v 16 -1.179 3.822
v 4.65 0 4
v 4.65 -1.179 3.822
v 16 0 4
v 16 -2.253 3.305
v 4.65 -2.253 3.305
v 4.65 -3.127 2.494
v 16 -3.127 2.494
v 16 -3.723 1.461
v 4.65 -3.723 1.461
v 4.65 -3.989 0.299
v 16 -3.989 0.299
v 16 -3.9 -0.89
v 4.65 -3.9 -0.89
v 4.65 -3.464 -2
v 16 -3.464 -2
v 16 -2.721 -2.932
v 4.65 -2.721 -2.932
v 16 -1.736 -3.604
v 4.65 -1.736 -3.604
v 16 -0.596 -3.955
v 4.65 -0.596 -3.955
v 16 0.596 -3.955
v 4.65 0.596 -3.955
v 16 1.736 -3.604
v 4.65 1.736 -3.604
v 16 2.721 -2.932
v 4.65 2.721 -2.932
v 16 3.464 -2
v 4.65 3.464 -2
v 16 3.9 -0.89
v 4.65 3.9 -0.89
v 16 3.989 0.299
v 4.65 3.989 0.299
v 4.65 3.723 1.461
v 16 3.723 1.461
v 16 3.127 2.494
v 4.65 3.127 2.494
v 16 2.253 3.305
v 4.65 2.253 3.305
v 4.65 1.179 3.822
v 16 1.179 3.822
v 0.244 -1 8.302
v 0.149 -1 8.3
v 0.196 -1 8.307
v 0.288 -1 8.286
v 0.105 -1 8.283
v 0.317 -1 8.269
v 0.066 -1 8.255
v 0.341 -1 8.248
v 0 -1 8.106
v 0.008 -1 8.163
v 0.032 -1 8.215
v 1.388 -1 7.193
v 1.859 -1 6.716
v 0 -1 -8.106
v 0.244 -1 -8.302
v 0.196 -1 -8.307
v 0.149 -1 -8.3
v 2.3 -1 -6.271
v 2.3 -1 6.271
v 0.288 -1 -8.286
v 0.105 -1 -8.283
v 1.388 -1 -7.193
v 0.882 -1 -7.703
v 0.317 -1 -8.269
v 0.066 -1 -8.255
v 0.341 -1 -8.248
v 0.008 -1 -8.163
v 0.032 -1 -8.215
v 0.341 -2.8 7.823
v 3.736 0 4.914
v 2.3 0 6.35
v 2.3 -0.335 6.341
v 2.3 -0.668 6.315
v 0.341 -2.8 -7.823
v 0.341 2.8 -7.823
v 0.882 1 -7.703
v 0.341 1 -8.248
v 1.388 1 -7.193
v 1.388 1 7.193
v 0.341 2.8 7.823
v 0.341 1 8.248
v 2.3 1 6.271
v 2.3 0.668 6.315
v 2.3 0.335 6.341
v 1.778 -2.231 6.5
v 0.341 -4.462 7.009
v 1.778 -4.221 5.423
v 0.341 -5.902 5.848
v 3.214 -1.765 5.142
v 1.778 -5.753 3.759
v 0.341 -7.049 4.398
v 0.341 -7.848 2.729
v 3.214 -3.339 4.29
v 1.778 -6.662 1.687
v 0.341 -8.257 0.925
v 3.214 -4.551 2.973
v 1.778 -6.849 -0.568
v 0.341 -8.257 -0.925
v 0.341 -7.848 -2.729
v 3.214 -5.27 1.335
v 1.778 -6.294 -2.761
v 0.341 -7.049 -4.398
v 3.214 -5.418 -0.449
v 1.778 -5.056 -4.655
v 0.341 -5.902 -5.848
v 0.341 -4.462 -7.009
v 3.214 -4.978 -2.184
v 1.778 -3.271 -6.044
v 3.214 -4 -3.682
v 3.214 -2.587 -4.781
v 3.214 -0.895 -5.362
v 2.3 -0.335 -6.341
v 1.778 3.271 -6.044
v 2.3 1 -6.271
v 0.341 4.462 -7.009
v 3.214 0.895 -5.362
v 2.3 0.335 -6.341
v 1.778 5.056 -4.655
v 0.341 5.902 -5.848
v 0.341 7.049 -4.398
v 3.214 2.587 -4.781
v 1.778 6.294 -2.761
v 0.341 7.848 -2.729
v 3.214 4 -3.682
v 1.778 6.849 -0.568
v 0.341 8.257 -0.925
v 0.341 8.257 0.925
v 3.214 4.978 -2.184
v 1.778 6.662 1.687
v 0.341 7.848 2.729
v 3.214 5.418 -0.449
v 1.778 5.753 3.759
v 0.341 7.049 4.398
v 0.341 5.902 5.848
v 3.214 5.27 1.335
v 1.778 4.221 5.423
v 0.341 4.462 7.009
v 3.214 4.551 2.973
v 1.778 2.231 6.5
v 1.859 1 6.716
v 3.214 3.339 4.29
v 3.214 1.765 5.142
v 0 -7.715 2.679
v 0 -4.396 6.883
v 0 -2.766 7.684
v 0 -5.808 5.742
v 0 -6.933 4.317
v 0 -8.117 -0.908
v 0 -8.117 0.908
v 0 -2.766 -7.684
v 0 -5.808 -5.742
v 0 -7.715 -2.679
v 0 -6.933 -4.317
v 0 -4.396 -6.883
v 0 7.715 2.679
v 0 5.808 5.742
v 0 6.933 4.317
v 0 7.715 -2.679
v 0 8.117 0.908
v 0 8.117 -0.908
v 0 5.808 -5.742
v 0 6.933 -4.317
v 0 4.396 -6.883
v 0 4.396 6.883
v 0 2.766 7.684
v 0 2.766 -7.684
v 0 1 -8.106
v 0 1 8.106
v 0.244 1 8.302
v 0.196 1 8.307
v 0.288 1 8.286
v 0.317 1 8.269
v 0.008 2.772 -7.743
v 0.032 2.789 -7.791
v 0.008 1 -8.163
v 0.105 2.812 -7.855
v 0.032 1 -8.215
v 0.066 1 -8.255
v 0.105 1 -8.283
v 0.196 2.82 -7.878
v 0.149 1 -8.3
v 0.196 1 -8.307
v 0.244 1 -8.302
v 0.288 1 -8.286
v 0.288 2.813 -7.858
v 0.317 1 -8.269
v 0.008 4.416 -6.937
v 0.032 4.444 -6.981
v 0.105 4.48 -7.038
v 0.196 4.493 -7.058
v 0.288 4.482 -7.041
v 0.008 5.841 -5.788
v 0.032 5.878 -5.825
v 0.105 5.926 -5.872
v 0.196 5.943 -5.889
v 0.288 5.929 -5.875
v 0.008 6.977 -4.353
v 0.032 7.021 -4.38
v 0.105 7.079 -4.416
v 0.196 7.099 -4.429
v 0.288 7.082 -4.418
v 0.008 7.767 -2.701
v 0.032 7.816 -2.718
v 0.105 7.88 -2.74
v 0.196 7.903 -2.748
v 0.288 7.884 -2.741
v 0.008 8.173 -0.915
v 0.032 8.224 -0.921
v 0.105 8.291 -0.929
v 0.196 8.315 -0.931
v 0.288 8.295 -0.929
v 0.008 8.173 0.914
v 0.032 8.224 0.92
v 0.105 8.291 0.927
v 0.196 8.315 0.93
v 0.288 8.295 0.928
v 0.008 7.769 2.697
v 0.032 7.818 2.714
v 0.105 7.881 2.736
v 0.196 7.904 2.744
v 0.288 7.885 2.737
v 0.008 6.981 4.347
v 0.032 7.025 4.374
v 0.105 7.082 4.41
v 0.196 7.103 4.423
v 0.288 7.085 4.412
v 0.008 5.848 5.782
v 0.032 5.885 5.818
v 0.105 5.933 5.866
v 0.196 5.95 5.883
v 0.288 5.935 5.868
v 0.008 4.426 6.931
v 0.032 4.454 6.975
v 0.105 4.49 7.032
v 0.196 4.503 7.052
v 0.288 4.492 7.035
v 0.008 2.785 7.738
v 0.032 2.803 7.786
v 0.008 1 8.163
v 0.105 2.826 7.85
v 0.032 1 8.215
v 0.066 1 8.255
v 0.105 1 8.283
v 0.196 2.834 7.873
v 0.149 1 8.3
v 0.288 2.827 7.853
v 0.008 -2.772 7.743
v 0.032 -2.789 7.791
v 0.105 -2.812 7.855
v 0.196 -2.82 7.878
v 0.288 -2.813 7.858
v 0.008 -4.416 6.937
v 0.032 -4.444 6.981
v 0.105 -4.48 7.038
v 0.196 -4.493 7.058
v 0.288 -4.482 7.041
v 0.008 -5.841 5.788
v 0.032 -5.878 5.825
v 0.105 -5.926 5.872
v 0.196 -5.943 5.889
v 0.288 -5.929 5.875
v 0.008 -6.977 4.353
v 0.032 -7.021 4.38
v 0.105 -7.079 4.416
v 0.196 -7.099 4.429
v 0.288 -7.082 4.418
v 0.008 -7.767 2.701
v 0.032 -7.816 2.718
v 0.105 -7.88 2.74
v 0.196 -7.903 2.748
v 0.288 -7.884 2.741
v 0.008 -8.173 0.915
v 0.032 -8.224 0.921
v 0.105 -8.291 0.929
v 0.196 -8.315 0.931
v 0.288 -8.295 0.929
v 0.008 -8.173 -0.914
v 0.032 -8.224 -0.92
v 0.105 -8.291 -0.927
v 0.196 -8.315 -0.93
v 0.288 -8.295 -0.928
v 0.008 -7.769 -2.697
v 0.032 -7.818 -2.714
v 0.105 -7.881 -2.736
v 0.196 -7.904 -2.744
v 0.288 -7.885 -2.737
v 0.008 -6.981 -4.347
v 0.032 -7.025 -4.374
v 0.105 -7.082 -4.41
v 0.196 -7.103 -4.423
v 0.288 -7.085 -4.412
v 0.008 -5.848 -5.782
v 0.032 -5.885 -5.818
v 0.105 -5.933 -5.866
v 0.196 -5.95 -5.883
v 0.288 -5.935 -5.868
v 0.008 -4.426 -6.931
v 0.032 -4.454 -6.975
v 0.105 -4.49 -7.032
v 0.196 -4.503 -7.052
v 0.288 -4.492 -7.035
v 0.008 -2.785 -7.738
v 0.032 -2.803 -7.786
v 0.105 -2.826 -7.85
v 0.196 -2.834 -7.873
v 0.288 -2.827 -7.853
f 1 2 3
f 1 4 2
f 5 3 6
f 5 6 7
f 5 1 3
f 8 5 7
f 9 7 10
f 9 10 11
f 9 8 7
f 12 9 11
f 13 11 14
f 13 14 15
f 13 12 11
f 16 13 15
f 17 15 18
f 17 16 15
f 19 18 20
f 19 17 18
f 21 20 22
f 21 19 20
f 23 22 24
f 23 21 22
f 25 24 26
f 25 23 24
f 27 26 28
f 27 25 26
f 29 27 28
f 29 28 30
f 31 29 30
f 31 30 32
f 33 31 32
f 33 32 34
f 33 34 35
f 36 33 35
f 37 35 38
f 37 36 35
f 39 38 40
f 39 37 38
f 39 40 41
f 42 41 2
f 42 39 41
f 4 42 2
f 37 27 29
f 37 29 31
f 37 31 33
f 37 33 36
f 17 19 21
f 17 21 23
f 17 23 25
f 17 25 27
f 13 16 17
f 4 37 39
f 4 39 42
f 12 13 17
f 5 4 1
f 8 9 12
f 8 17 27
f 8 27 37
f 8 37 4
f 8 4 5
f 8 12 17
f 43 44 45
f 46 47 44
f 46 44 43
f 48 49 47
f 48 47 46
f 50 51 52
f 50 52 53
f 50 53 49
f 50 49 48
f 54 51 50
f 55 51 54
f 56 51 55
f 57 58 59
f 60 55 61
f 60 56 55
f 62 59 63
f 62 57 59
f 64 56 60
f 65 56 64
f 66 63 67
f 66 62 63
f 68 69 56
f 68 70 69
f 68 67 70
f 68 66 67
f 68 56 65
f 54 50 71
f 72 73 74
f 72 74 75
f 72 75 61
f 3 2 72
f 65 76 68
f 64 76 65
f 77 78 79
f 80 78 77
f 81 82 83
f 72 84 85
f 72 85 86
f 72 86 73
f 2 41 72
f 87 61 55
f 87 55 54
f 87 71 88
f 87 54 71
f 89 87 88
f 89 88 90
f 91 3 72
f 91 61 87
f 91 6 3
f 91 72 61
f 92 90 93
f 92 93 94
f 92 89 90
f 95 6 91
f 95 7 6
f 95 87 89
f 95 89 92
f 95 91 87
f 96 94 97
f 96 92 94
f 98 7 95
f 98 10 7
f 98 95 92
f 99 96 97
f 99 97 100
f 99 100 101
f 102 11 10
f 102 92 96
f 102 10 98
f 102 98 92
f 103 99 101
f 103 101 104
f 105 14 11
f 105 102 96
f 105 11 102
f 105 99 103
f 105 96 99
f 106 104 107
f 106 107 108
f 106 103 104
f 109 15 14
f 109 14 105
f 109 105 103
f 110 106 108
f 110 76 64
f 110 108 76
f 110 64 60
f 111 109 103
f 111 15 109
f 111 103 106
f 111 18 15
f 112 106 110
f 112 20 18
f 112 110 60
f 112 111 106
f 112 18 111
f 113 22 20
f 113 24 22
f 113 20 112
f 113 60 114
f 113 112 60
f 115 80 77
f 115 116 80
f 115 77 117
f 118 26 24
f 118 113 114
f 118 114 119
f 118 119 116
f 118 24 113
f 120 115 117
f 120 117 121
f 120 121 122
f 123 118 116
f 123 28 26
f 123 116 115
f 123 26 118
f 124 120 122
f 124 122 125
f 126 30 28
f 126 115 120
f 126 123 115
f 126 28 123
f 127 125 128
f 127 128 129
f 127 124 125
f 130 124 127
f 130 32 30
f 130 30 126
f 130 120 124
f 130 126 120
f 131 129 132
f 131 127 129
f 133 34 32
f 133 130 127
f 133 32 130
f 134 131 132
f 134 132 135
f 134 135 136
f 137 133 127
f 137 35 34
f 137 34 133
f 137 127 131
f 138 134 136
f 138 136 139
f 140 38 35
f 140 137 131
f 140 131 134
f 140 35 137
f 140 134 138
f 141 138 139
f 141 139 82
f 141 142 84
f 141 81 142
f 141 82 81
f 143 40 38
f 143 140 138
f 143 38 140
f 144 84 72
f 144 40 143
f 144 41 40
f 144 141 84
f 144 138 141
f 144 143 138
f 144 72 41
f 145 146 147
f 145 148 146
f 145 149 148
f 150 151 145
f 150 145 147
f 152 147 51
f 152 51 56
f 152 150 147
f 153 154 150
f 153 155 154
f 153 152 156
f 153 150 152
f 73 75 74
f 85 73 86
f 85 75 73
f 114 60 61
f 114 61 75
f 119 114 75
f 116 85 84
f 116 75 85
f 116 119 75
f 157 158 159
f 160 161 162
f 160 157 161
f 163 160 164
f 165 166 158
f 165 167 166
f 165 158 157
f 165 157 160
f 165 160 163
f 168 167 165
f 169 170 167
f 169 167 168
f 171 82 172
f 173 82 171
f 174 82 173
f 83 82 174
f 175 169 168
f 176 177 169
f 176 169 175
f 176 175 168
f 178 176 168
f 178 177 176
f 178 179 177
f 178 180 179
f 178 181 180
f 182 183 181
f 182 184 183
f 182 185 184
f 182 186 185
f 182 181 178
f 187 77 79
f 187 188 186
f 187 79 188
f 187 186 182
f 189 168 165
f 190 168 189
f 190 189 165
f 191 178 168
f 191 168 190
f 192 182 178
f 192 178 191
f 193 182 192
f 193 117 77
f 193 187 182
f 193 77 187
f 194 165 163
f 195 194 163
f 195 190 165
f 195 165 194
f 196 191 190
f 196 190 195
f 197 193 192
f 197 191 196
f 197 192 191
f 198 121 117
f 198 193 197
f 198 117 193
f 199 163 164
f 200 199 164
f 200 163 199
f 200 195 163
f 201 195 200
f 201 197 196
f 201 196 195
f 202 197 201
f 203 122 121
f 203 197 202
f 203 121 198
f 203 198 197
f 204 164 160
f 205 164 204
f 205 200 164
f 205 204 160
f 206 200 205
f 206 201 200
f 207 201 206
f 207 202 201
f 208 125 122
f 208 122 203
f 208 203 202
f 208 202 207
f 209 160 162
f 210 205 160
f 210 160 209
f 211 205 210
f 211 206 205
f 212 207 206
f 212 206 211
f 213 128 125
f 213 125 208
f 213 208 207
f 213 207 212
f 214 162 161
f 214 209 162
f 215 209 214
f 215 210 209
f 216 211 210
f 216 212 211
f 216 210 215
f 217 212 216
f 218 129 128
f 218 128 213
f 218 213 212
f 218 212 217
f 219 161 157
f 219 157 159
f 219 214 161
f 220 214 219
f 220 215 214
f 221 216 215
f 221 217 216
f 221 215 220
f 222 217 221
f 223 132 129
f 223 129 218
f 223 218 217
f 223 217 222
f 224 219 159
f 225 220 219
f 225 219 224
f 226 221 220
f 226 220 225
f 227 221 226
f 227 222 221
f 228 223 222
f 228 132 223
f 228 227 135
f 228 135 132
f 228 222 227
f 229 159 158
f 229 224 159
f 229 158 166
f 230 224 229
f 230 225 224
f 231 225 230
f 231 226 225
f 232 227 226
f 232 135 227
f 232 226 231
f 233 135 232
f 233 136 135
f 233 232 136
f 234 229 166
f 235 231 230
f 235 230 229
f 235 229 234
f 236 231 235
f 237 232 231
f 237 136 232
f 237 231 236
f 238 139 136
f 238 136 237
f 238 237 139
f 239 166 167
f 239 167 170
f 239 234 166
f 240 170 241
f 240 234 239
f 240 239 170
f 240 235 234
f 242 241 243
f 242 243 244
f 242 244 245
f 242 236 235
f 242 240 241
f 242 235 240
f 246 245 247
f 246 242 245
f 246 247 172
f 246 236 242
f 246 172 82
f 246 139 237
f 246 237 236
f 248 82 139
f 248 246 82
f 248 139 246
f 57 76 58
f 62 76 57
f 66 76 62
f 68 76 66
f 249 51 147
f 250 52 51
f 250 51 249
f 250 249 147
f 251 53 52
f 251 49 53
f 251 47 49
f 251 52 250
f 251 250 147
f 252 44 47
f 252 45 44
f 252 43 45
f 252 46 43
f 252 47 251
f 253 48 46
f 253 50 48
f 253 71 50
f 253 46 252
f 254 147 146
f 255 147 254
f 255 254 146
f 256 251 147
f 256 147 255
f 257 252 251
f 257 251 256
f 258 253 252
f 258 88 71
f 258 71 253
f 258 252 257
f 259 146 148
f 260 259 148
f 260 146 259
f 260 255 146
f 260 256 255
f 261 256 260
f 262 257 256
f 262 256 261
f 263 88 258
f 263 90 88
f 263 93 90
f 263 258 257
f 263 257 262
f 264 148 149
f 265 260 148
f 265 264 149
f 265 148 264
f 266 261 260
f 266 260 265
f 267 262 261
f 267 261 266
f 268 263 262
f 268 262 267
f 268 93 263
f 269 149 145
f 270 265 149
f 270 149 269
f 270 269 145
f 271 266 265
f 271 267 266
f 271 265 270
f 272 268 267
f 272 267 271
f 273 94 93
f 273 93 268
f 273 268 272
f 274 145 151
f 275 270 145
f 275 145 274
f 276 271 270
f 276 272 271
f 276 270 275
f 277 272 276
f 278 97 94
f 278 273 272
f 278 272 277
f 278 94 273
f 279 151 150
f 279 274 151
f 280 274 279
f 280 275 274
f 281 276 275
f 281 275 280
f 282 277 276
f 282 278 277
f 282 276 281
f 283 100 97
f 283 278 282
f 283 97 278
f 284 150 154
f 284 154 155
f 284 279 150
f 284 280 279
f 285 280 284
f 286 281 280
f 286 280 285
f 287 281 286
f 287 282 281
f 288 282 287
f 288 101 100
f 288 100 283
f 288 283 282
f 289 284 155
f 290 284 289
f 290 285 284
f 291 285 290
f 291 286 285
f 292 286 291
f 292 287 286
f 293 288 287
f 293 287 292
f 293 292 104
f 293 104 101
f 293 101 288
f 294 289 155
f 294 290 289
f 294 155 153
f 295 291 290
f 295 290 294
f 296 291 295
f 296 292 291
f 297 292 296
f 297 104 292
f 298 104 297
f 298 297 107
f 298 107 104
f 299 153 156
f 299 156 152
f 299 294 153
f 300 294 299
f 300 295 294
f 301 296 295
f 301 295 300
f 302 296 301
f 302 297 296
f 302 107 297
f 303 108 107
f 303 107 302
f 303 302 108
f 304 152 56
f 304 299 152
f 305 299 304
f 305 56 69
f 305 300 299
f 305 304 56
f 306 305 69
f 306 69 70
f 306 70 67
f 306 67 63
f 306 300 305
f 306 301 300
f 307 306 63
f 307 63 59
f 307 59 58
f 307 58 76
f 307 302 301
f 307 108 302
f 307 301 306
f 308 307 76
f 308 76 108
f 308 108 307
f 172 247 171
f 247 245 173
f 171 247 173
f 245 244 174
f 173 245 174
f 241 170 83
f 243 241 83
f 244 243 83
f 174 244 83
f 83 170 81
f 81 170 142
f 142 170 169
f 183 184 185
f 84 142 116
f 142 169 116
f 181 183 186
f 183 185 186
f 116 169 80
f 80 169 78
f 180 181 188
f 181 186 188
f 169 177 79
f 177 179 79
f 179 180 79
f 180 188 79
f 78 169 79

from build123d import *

# Parameters (mm, degrees)
HEADFILLET_R     = 0.2
NOTCH_DEPTH      = 20.900217222
NOTCH_DEPTH_BACK = 20.900217222
SKETCH2_W        = 2.3
SKETCH2_H        = 2


with BuildPart() as part:
    # Sketch1 → Base (revolve)
    with BuildSketch(Plane.XY, mode=Mode.PRIVATE) as base_sk:
        Polygon((0, 0), (0, 8.65), (4.65, 4), (16, 4), (16, 0), align=None)
    revolve(base_sk.sketch.rotate(Axis((-5.569640847, 0, 0), (1, 0, 0)), 90), axis=Axis((-5.569640847, 0, 0), (1, 0, 0)))

    # HeadFillet
    headfillet_edges = [part.edges().sort_by_distance(p)[0] for p in [
        (0, 0, -8.65),
    ]]
    fillet(headfillet_edges, radius=HEADFILLET_R)

    # Sketch2 → Notch (cut, two sides: drawn at the far end of the back side and taken through both)
    with BuildSketch(Plane.XY.offset(-NOTCH_DEPTH_BACK)):
        with Locations((1.15, 0)):
            Rectangle(SKETCH2_W, SKETCH2_H)
    extrude(amount=NOTCH_DEPTH + NOTCH_DEPTH_BACK, mode=Mode.SUBTRACT)


solid = part.part
